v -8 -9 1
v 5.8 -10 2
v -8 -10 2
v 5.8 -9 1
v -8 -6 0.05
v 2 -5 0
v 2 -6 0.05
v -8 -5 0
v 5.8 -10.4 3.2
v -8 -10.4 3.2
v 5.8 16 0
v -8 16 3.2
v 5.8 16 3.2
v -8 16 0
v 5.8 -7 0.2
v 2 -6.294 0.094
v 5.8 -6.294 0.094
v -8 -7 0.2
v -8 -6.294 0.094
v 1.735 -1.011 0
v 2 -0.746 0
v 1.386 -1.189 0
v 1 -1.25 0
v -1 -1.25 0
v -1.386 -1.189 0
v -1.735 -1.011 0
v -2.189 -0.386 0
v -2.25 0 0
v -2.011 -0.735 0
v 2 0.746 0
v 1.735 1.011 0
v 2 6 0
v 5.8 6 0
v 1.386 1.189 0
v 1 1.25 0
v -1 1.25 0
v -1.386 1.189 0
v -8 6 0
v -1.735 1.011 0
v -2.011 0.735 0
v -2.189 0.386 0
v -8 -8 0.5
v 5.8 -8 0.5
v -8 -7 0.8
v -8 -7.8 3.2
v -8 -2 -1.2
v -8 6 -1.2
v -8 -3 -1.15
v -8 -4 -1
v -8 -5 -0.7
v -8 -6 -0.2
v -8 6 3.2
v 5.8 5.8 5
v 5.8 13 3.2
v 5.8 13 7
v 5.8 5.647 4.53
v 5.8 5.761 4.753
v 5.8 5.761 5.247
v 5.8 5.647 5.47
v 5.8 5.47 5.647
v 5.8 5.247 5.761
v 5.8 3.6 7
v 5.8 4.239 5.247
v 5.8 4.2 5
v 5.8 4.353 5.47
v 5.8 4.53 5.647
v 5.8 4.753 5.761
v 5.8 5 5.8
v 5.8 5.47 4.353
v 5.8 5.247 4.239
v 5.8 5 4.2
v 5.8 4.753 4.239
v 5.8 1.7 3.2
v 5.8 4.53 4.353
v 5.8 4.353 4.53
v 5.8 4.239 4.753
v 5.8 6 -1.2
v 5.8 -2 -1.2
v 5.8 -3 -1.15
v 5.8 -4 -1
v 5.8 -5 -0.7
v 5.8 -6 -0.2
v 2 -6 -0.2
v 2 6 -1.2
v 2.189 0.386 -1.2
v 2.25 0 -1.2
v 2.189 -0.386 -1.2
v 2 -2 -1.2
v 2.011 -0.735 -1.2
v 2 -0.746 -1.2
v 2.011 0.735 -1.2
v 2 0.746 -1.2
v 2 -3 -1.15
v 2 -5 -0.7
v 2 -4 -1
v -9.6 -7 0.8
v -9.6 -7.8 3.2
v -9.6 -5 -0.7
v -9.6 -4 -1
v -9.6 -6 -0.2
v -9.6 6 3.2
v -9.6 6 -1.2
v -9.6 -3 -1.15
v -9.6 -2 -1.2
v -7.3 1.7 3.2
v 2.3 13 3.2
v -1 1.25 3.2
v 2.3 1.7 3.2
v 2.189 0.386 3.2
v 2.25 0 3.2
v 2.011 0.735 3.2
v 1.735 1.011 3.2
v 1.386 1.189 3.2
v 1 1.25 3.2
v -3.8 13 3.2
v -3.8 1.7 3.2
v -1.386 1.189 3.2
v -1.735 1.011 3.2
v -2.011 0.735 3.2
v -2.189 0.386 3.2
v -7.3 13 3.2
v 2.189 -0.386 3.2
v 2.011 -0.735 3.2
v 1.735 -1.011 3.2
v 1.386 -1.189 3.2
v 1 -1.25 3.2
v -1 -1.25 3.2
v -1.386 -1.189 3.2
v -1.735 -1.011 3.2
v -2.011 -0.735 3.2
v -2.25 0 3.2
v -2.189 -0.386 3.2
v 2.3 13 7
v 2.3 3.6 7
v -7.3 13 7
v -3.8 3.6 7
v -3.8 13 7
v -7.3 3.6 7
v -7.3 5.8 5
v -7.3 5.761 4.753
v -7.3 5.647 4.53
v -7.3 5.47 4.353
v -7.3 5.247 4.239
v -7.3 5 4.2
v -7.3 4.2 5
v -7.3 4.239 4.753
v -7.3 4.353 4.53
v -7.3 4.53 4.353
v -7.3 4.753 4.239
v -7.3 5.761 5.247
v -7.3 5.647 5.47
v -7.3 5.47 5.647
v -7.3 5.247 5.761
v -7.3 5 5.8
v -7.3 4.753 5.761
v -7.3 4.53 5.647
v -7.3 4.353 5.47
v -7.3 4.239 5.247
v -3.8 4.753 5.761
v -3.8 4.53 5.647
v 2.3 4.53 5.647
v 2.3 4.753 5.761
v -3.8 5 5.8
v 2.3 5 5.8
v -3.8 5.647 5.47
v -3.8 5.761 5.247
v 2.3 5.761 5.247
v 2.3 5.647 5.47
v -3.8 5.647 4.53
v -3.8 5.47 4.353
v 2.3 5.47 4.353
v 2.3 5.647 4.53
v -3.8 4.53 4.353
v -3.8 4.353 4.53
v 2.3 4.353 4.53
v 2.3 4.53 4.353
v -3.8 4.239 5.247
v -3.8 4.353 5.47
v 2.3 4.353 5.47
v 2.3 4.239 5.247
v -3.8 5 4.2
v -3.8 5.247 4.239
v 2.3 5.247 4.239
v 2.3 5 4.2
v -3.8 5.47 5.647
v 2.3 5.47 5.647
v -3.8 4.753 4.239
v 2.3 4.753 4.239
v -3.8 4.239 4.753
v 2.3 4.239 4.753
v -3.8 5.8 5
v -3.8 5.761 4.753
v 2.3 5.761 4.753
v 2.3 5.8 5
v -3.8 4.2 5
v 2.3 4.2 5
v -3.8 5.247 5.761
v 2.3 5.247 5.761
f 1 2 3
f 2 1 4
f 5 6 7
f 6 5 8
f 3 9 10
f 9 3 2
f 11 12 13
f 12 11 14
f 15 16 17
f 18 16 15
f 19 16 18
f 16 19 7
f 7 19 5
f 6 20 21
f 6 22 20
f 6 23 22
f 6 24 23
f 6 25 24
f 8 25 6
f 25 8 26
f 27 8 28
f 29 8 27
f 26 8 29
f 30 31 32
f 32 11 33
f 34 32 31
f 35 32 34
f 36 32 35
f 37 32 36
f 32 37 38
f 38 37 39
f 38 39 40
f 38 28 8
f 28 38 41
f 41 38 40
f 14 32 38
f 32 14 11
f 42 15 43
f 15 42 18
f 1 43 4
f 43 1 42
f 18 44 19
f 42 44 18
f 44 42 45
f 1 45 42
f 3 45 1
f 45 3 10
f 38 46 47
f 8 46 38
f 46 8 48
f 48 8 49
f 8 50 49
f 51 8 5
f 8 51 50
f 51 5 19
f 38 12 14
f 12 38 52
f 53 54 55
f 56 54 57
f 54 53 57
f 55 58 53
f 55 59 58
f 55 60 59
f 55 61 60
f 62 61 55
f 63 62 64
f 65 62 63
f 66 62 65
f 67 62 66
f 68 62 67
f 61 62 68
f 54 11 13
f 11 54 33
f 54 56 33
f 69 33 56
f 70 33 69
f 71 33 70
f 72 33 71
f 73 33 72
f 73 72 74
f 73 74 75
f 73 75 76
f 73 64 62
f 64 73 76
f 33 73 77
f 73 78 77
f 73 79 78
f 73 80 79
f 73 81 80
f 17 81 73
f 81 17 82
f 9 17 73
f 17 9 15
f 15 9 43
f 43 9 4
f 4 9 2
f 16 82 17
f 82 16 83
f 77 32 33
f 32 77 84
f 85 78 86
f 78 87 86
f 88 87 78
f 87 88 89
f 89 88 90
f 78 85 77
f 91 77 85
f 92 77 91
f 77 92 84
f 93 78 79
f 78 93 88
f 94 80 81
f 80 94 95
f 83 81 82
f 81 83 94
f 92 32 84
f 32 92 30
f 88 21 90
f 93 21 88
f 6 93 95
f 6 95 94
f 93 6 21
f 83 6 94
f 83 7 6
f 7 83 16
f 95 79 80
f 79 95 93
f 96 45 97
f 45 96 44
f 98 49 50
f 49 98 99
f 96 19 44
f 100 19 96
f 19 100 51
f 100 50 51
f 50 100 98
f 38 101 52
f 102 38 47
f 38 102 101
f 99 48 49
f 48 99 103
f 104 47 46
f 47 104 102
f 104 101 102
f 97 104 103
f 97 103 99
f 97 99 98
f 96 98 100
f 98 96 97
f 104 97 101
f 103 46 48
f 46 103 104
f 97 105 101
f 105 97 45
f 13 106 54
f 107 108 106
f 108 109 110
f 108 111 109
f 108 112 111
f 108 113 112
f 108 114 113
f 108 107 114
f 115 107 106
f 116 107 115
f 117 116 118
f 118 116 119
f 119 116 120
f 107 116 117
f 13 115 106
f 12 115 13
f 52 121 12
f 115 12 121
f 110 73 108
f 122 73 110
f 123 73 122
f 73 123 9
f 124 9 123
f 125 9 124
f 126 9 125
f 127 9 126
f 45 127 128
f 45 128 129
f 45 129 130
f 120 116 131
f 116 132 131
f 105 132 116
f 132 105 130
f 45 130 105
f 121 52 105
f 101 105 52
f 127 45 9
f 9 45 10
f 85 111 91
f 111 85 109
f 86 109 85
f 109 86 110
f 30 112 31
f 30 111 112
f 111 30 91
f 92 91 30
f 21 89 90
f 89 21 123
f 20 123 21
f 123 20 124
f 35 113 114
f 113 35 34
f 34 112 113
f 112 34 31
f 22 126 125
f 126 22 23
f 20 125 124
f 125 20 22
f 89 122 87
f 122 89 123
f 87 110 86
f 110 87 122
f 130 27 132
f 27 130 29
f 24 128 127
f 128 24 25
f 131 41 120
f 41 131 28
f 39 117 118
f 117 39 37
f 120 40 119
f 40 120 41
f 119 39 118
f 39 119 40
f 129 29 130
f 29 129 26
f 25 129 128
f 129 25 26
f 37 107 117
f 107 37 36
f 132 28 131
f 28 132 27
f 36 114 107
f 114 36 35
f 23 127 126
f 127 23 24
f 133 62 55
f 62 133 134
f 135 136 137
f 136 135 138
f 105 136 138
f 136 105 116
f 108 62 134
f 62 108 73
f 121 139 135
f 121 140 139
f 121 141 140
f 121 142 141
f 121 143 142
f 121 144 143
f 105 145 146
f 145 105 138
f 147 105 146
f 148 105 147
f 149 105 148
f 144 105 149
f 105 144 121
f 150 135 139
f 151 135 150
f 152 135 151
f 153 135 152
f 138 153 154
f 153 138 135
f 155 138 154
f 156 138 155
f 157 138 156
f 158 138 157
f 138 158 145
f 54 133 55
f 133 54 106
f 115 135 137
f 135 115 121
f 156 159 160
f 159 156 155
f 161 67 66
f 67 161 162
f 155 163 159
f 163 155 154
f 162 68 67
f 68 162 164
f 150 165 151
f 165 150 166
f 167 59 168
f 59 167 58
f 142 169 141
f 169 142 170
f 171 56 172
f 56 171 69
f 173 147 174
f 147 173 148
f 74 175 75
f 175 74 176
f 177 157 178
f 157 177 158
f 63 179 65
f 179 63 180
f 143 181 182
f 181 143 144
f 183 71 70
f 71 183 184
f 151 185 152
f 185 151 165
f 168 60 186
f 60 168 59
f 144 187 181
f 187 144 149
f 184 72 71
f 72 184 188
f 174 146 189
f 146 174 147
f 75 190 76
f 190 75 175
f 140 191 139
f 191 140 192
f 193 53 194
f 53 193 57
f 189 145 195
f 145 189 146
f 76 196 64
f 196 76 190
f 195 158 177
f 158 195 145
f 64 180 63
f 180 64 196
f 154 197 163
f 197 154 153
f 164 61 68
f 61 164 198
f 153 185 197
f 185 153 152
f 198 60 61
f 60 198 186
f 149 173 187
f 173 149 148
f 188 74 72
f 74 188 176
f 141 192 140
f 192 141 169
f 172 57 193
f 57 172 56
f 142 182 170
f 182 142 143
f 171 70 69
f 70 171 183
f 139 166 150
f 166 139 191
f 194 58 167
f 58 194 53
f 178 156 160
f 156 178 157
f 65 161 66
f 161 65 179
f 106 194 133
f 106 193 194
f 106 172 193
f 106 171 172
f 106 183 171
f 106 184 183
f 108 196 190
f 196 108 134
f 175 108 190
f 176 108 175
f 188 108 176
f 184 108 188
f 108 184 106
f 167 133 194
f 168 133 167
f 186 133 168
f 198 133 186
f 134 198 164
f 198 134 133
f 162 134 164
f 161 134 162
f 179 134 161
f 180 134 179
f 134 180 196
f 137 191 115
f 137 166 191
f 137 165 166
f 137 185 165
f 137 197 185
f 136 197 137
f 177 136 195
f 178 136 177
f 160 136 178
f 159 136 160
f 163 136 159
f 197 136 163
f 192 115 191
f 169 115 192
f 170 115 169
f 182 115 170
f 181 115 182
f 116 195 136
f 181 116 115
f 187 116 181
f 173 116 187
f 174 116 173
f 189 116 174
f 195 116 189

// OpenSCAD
// file: guided_sewing_foot_template.scad
// The diameter of the MATIC rod
matic_rod_diameter = 1.6;

// The height at which the MATIC rod is placed over the plate (the least strict parameter, as the foot is amortized)
matic_rod_dz = 5.0; 

// The Y offset between the MATIC rod and the needle
matic_offset_dy = 5.0;

// The total width of the MATIC handle (including allowance)
matic_handle_width = 6.1; 

// The X offset between the needle and the center of the MATIC handle on Janome machines with a maximum stitch width of 7 mm 
janome_matic_offset_dx = -0.75;

// The width of the transport mechanism in the Janome machines
janome_transport_width = 16.0;

needle_tunnel_length_max = 7.0;
needle_tunnel_margin = 4.0;

foot_base_leftside_width = janome_transport_width / 2;
foot_base_rightside_width_full = janome_transport_width / 2;

guide_min_width = 1.6;
ear_width = 3.5;

foot_base_height = 3.2;

primary_front_length = 5.0;
primary_back_length = 16.0;

short_guide_front_length = 2.0;
short_guide_back_length = 6.0;

ears_piece_width = matic_handle_width + ear_width * 2;
right_ear_edge_x = janome_matic_offset_dx + matic_handle_width / 2 + ear_width;

module reflection(
    mirror_vector = [1, 0, 0]
) {
    union() {
        children();
        mirror(mirror_vector) {
            children();
        }
    }
}

module make_wing(
    width,
    front_length,
    back_length,
) {
    h_max = 5.0;
    dx = 1;
    
    rotate([180, -90, 0])
    linear_extrude(height=width)
    polygon(
        points=[
            [h_max, -back_length],
            [0, -back_length],
            [0.00, front_length + dx * 0],
            [0.05, front_length + dx * 1],
            [0.20, front_length + dx * 2],
            [0.50, front_length + dx * 3],
            [1.00, front_length + dx * 4],
            [2.00, front_length + dx * 5],
            [h_max, front_length + dx * 6]
        ],
        paths=[
            [0, 1, 2, 3, 4, 5, 6, 7, 8],
        ]
    );
}

module top_cutter_global() {
    a = 40;
    h = 20;
    
    translate([-a / 2, -a / 2, foot_base_height])
    cube([a, a, h]);
}

module ears_piece_base_local() {
    back_length = 8.0;
    height = 4.0;
    
    translate([-ears_piece_width/2, 0, 0])
    rotate([180, -90, 0])
    linear_extrude(height=ears_piece_width)
    polygon(
        points=[
            [height / 2, -back_length],
            [-height / 2, -back_length],
            [-height / 2, 3.4],
            [height / 2, 1.4],
        ],
        paths=[
            [0, 1, 2, 3],
        ]
    );
}

module matic_rod_cutter_local() {
    length = 40;
    
    translate([-length / 2, 0, 0])
    rotate([180, -90, 0])
    cylinder(h = length, r = matic_rod_diameter / 2, $fn = 20);
}

module matic_handle_cutter_local() {
    a = matic_handle_width;
    h = 30;
    
    translate([-a / 2, -h / 2, -h / 2])
    cube([a, h, h]);
}

module ears_piece_local() {
    difference() {
        difference() {
            ears_piece_base_local();
            matic_rod_cutter_local();
        }
        matic_handle_cutter_local();
    }
}

module ears_piece_global() {
    translate([
        janome_matic_offset_dx,
        matic_offset_dy,
        matic_rod_dz,
    ])
    ears_piece_local();
}

module make_needle_tunnel_cutter(
    length,
    width,
) {
    height = 10;

    translate([0, 0, -height / 2]) {
        translate([-length / 2, -width / 2, 0])
        cube([length, width, height]);

        reflection([1, 0, 0]) {
            translate([length / 2, 0, 0])
            cylinder(h = height, r = width / 2, $fn = 20);
        }
    }
}

module make_guided_foot(
    // The distance between the needle and the guide
    guide_offset,
    secondary_guide_offset = undef,
    guide_depth = 0.8,
    needle_tunnel_length_limit = needle_tunnel_length_max,
    use_full_width = true,
    use_full_length = false,
) {
    guide_front_length = use_full_length ? primary_front_length : short_guide_front_length;
    guide_back_length = use_full_length ? primary_back_length : short_guide_back_length;

    foot_base_rightside_width_free = use_full_width ? foot_base_rightside_width_full : right_ear_edge_x;
    foot_base_rightside_width = max(guide_offset, foot_base_rightside_width_free);

    // The nominal lenth of the needle tunnel (the maximal usable stich width)
    needle_tunnel_length_safe = (foot_base_rightside_width - needle_tunnel_margin) * 2;
    needle_tunnel_length_effective_max = min(needle_tunnel_length_limit, needle_tunnel_length_max);
    needle_tunnel_length = min(needle_tunnel_length_safe, needle_tunnel_length_effective_max);

    module make_guide(
        offset,
        base_side_width,
    ) {
        width = max(foot_base_rightside_width - offset, guide_min_width);

        translate([offset, 0, -guide_depth])
        make_wing(
            width = width,
            front_length = guide_front_length,
            back_length = guide_back_length
        );
    }

    module foot_base_global() {
        translate([-foot_base_leftside_width, 0, 0])
        make_wing(
            width = foot_base_leftside_width + foot_base_rightside_width,
            front_length = primary_front_length,
            back_length = primary_back_length
        );
    }

    module guide_global() {
        make_guide(
            offset = guide_offset,
            base_side_width = foot_base_rightside_width
        );
    }

    module secondary_guide_global() {
        if (!is_undef(secondary_guide_offset)) {
            scale([-1, 1, 1])
            make_guide(
                offset = secondary_guide_offset,
                base_side_width = foot_base_leftside_width
            );
        }
    }

    module guided_foot_global() {
        difference() {
            difference() {
                union() {
                    foot_base_global();
                    guide_global();
                    secondary_guide_global();
                }

                top_cutter_global();
            };

            needle_tunnel_cutter_global();
        }

        ears_piece_global();
    }

    module needle_tunnel_cutter_global() {
        make_needle_tunnel_cutter(
            length = needle_tunnel_length,
            width = 2.5
        );
    }

    guided_foot_global();
}
// main file
include <guided_sewing_foot_template.scad>;

make_guided_foot(
    guide_offset = 2.0,
    secondary_guide_offset = 8.0,
    guide_depth = 1.2,
    needle_tunnel_length_limit = 2.0,
    use_full_width = false
);
